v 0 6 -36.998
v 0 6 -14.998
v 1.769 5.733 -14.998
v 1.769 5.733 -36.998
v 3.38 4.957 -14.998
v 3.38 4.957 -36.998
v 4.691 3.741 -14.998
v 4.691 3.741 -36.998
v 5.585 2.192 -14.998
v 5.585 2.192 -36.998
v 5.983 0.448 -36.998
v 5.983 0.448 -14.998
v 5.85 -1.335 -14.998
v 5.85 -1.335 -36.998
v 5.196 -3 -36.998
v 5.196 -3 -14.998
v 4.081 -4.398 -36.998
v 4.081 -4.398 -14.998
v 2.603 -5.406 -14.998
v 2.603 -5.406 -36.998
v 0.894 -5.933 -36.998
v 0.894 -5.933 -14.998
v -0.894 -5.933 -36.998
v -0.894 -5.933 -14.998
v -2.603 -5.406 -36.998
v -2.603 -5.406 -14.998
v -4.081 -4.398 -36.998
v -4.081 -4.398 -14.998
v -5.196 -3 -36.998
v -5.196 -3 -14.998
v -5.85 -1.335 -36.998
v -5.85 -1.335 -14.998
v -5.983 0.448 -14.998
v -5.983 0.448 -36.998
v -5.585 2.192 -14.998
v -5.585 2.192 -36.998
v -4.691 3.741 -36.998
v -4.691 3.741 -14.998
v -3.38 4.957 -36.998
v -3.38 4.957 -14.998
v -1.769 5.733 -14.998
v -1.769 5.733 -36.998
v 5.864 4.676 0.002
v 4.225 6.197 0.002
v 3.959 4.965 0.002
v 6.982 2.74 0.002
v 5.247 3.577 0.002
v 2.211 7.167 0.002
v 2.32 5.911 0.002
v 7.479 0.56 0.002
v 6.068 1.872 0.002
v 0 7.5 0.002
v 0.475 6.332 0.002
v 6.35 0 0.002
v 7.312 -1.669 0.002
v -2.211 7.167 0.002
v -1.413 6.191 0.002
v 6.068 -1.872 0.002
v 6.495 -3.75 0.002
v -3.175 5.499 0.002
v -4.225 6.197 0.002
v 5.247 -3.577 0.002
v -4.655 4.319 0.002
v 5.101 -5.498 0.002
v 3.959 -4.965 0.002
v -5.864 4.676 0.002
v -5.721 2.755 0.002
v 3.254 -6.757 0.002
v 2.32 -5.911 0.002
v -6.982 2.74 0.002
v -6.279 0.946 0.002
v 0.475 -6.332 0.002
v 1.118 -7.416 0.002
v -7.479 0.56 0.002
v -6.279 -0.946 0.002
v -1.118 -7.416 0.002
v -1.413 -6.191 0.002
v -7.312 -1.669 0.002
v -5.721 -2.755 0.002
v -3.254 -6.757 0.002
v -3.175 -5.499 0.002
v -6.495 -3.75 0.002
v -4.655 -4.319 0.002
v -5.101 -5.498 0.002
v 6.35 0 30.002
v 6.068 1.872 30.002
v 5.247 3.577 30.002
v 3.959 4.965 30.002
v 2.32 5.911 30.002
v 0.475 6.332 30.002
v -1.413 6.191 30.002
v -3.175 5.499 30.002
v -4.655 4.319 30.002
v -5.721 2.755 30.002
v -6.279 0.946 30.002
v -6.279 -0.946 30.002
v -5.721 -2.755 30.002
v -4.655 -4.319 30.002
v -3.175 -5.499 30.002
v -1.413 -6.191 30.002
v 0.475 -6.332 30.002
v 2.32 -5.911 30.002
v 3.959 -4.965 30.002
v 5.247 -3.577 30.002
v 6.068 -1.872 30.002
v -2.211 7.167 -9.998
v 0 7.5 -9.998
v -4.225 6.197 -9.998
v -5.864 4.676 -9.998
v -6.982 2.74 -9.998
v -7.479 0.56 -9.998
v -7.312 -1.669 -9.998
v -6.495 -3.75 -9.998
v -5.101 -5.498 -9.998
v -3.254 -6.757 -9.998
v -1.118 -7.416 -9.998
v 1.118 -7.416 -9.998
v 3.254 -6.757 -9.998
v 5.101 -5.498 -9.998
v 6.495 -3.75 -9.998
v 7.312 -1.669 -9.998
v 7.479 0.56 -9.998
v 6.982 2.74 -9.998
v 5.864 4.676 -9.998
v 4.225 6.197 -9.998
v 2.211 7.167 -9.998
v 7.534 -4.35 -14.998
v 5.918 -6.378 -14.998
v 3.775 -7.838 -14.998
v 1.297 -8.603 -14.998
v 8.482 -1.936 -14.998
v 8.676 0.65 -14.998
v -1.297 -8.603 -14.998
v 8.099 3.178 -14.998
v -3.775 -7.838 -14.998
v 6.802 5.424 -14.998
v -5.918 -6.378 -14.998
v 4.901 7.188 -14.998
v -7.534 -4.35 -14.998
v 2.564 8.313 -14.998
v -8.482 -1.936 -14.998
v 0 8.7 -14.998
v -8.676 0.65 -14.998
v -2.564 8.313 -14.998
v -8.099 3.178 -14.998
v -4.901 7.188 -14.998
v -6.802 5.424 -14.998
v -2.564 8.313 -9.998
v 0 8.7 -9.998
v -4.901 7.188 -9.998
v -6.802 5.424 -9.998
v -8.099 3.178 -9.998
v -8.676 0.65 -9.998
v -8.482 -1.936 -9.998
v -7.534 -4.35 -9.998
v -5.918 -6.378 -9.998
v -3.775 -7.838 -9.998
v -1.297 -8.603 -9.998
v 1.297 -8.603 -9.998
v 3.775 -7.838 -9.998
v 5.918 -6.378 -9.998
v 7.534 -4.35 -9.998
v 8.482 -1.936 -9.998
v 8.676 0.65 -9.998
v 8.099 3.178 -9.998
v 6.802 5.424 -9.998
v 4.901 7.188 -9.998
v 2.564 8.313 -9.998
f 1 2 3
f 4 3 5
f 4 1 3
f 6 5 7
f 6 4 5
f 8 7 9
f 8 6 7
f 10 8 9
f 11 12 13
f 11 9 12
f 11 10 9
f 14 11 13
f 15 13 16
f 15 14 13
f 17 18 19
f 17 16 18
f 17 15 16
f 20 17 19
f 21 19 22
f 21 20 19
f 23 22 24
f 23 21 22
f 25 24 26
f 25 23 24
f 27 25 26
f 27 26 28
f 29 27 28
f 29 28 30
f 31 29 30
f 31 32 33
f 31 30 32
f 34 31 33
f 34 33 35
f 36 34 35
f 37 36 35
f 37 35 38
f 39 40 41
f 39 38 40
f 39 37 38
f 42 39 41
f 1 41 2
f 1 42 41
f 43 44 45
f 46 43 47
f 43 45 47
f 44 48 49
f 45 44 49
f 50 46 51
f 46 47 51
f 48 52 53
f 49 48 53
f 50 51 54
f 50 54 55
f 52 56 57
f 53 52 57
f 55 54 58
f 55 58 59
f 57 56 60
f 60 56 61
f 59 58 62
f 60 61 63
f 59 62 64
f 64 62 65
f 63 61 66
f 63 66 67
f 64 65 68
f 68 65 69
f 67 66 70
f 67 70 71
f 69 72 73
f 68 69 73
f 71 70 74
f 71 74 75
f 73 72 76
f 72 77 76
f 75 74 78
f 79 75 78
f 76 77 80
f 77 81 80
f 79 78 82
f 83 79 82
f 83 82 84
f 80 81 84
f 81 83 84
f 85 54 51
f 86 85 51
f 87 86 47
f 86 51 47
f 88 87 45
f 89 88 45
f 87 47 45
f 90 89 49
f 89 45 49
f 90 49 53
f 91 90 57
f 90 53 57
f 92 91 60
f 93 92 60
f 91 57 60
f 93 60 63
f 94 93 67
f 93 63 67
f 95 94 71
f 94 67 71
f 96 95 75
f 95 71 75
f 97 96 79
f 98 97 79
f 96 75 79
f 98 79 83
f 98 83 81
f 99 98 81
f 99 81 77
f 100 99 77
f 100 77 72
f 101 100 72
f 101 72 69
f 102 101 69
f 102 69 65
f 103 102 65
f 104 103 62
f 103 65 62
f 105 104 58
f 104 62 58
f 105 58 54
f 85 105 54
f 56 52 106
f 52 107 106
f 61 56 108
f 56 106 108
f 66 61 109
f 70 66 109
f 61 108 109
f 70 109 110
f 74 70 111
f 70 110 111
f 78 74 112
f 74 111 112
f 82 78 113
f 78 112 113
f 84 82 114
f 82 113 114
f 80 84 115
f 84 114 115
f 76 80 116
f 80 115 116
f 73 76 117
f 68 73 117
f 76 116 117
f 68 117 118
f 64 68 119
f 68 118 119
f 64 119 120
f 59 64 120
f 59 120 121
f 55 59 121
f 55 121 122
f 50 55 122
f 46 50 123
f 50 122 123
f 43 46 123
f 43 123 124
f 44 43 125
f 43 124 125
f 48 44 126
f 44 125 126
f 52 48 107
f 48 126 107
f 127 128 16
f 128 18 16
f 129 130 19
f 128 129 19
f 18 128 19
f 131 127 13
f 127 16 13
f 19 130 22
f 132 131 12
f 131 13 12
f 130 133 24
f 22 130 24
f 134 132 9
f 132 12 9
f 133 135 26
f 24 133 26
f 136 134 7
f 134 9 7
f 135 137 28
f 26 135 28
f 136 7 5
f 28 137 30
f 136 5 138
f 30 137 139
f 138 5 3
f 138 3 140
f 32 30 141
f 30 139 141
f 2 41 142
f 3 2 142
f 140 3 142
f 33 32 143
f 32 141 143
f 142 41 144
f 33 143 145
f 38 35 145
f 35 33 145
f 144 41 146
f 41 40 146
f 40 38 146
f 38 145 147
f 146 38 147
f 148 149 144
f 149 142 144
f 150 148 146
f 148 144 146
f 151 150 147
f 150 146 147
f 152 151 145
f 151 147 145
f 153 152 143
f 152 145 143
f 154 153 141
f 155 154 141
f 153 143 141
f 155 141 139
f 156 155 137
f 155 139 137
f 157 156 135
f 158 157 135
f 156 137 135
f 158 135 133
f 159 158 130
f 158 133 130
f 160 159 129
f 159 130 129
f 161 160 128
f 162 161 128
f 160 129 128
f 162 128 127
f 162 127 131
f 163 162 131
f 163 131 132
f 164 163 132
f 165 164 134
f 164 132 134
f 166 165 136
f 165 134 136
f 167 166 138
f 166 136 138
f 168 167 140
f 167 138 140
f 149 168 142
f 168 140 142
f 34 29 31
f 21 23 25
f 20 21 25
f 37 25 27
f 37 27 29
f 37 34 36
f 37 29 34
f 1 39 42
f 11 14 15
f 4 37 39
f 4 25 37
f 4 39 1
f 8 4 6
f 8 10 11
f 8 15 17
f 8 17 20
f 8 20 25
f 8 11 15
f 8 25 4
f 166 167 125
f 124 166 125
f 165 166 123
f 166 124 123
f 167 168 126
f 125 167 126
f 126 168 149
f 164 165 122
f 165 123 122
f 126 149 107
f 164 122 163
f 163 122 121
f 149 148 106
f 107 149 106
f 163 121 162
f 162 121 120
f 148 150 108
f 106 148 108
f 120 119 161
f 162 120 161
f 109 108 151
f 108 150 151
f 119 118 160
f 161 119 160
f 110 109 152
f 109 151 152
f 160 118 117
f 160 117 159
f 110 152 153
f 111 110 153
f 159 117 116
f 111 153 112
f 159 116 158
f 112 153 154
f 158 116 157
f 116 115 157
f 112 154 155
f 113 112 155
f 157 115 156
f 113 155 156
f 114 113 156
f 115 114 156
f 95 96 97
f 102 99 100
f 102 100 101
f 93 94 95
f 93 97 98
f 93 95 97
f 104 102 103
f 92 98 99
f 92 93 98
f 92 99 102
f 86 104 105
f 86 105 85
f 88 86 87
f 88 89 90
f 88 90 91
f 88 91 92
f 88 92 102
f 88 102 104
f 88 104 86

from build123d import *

# Parameters (mm, degrees)
SKETCH5_R             = 6.35
OUTSIDE_EXTRUDE_DEPTH = 30
INSIDE_START          = 2
SKETCH6_R             = 6
INSIDE_EXTRUDE_DEPTH  = 2


with BuildPart() as part:
    # Sketch3 → Initial Resolve -- Exact Length (revolve)
    with BuildSketch(Plane(origin=(0, 0, 0), x_dir=(0, 0, -1), z_dir=(1, 0, 0))):
        Polygon((9.998219577, 8.7), (14.998219577, 8.7), (14.998219577, 6), (34.998219577, 6), (34.998219577, 0), (0, 0), (-0.001780423, 0), (-0.001780423, 7.5), (9.998219577, 7.5), align=None)
    revolve(axis=Axis((0, 0, -34.998219577), (0, 0, 1)))

    # Sketch5 → Outside Extrude (add)
    with BuildSketch(Plane.XY.offset(0.001780423)):
        Circle(SKETCH5_R)
    extrude(amount=OUTSIDE_EXTRUDE_DEPTH)

    # Sketch6 → Inside Extrude (add)
    with BuildSketch(Plane(origin=(0, 0, -34.998219577), x_dir=(-1, 0, 0), z_dir=(0, 0, -1)).offset(INSIDE_START)):
        with Locations(Location((0, 0, 0), (0, 0, 90))):
            Circle(SKETCH6_R)
    extrude(amount=-INSIDE_EXTRUDE_DEPTH)


solid = part.part
